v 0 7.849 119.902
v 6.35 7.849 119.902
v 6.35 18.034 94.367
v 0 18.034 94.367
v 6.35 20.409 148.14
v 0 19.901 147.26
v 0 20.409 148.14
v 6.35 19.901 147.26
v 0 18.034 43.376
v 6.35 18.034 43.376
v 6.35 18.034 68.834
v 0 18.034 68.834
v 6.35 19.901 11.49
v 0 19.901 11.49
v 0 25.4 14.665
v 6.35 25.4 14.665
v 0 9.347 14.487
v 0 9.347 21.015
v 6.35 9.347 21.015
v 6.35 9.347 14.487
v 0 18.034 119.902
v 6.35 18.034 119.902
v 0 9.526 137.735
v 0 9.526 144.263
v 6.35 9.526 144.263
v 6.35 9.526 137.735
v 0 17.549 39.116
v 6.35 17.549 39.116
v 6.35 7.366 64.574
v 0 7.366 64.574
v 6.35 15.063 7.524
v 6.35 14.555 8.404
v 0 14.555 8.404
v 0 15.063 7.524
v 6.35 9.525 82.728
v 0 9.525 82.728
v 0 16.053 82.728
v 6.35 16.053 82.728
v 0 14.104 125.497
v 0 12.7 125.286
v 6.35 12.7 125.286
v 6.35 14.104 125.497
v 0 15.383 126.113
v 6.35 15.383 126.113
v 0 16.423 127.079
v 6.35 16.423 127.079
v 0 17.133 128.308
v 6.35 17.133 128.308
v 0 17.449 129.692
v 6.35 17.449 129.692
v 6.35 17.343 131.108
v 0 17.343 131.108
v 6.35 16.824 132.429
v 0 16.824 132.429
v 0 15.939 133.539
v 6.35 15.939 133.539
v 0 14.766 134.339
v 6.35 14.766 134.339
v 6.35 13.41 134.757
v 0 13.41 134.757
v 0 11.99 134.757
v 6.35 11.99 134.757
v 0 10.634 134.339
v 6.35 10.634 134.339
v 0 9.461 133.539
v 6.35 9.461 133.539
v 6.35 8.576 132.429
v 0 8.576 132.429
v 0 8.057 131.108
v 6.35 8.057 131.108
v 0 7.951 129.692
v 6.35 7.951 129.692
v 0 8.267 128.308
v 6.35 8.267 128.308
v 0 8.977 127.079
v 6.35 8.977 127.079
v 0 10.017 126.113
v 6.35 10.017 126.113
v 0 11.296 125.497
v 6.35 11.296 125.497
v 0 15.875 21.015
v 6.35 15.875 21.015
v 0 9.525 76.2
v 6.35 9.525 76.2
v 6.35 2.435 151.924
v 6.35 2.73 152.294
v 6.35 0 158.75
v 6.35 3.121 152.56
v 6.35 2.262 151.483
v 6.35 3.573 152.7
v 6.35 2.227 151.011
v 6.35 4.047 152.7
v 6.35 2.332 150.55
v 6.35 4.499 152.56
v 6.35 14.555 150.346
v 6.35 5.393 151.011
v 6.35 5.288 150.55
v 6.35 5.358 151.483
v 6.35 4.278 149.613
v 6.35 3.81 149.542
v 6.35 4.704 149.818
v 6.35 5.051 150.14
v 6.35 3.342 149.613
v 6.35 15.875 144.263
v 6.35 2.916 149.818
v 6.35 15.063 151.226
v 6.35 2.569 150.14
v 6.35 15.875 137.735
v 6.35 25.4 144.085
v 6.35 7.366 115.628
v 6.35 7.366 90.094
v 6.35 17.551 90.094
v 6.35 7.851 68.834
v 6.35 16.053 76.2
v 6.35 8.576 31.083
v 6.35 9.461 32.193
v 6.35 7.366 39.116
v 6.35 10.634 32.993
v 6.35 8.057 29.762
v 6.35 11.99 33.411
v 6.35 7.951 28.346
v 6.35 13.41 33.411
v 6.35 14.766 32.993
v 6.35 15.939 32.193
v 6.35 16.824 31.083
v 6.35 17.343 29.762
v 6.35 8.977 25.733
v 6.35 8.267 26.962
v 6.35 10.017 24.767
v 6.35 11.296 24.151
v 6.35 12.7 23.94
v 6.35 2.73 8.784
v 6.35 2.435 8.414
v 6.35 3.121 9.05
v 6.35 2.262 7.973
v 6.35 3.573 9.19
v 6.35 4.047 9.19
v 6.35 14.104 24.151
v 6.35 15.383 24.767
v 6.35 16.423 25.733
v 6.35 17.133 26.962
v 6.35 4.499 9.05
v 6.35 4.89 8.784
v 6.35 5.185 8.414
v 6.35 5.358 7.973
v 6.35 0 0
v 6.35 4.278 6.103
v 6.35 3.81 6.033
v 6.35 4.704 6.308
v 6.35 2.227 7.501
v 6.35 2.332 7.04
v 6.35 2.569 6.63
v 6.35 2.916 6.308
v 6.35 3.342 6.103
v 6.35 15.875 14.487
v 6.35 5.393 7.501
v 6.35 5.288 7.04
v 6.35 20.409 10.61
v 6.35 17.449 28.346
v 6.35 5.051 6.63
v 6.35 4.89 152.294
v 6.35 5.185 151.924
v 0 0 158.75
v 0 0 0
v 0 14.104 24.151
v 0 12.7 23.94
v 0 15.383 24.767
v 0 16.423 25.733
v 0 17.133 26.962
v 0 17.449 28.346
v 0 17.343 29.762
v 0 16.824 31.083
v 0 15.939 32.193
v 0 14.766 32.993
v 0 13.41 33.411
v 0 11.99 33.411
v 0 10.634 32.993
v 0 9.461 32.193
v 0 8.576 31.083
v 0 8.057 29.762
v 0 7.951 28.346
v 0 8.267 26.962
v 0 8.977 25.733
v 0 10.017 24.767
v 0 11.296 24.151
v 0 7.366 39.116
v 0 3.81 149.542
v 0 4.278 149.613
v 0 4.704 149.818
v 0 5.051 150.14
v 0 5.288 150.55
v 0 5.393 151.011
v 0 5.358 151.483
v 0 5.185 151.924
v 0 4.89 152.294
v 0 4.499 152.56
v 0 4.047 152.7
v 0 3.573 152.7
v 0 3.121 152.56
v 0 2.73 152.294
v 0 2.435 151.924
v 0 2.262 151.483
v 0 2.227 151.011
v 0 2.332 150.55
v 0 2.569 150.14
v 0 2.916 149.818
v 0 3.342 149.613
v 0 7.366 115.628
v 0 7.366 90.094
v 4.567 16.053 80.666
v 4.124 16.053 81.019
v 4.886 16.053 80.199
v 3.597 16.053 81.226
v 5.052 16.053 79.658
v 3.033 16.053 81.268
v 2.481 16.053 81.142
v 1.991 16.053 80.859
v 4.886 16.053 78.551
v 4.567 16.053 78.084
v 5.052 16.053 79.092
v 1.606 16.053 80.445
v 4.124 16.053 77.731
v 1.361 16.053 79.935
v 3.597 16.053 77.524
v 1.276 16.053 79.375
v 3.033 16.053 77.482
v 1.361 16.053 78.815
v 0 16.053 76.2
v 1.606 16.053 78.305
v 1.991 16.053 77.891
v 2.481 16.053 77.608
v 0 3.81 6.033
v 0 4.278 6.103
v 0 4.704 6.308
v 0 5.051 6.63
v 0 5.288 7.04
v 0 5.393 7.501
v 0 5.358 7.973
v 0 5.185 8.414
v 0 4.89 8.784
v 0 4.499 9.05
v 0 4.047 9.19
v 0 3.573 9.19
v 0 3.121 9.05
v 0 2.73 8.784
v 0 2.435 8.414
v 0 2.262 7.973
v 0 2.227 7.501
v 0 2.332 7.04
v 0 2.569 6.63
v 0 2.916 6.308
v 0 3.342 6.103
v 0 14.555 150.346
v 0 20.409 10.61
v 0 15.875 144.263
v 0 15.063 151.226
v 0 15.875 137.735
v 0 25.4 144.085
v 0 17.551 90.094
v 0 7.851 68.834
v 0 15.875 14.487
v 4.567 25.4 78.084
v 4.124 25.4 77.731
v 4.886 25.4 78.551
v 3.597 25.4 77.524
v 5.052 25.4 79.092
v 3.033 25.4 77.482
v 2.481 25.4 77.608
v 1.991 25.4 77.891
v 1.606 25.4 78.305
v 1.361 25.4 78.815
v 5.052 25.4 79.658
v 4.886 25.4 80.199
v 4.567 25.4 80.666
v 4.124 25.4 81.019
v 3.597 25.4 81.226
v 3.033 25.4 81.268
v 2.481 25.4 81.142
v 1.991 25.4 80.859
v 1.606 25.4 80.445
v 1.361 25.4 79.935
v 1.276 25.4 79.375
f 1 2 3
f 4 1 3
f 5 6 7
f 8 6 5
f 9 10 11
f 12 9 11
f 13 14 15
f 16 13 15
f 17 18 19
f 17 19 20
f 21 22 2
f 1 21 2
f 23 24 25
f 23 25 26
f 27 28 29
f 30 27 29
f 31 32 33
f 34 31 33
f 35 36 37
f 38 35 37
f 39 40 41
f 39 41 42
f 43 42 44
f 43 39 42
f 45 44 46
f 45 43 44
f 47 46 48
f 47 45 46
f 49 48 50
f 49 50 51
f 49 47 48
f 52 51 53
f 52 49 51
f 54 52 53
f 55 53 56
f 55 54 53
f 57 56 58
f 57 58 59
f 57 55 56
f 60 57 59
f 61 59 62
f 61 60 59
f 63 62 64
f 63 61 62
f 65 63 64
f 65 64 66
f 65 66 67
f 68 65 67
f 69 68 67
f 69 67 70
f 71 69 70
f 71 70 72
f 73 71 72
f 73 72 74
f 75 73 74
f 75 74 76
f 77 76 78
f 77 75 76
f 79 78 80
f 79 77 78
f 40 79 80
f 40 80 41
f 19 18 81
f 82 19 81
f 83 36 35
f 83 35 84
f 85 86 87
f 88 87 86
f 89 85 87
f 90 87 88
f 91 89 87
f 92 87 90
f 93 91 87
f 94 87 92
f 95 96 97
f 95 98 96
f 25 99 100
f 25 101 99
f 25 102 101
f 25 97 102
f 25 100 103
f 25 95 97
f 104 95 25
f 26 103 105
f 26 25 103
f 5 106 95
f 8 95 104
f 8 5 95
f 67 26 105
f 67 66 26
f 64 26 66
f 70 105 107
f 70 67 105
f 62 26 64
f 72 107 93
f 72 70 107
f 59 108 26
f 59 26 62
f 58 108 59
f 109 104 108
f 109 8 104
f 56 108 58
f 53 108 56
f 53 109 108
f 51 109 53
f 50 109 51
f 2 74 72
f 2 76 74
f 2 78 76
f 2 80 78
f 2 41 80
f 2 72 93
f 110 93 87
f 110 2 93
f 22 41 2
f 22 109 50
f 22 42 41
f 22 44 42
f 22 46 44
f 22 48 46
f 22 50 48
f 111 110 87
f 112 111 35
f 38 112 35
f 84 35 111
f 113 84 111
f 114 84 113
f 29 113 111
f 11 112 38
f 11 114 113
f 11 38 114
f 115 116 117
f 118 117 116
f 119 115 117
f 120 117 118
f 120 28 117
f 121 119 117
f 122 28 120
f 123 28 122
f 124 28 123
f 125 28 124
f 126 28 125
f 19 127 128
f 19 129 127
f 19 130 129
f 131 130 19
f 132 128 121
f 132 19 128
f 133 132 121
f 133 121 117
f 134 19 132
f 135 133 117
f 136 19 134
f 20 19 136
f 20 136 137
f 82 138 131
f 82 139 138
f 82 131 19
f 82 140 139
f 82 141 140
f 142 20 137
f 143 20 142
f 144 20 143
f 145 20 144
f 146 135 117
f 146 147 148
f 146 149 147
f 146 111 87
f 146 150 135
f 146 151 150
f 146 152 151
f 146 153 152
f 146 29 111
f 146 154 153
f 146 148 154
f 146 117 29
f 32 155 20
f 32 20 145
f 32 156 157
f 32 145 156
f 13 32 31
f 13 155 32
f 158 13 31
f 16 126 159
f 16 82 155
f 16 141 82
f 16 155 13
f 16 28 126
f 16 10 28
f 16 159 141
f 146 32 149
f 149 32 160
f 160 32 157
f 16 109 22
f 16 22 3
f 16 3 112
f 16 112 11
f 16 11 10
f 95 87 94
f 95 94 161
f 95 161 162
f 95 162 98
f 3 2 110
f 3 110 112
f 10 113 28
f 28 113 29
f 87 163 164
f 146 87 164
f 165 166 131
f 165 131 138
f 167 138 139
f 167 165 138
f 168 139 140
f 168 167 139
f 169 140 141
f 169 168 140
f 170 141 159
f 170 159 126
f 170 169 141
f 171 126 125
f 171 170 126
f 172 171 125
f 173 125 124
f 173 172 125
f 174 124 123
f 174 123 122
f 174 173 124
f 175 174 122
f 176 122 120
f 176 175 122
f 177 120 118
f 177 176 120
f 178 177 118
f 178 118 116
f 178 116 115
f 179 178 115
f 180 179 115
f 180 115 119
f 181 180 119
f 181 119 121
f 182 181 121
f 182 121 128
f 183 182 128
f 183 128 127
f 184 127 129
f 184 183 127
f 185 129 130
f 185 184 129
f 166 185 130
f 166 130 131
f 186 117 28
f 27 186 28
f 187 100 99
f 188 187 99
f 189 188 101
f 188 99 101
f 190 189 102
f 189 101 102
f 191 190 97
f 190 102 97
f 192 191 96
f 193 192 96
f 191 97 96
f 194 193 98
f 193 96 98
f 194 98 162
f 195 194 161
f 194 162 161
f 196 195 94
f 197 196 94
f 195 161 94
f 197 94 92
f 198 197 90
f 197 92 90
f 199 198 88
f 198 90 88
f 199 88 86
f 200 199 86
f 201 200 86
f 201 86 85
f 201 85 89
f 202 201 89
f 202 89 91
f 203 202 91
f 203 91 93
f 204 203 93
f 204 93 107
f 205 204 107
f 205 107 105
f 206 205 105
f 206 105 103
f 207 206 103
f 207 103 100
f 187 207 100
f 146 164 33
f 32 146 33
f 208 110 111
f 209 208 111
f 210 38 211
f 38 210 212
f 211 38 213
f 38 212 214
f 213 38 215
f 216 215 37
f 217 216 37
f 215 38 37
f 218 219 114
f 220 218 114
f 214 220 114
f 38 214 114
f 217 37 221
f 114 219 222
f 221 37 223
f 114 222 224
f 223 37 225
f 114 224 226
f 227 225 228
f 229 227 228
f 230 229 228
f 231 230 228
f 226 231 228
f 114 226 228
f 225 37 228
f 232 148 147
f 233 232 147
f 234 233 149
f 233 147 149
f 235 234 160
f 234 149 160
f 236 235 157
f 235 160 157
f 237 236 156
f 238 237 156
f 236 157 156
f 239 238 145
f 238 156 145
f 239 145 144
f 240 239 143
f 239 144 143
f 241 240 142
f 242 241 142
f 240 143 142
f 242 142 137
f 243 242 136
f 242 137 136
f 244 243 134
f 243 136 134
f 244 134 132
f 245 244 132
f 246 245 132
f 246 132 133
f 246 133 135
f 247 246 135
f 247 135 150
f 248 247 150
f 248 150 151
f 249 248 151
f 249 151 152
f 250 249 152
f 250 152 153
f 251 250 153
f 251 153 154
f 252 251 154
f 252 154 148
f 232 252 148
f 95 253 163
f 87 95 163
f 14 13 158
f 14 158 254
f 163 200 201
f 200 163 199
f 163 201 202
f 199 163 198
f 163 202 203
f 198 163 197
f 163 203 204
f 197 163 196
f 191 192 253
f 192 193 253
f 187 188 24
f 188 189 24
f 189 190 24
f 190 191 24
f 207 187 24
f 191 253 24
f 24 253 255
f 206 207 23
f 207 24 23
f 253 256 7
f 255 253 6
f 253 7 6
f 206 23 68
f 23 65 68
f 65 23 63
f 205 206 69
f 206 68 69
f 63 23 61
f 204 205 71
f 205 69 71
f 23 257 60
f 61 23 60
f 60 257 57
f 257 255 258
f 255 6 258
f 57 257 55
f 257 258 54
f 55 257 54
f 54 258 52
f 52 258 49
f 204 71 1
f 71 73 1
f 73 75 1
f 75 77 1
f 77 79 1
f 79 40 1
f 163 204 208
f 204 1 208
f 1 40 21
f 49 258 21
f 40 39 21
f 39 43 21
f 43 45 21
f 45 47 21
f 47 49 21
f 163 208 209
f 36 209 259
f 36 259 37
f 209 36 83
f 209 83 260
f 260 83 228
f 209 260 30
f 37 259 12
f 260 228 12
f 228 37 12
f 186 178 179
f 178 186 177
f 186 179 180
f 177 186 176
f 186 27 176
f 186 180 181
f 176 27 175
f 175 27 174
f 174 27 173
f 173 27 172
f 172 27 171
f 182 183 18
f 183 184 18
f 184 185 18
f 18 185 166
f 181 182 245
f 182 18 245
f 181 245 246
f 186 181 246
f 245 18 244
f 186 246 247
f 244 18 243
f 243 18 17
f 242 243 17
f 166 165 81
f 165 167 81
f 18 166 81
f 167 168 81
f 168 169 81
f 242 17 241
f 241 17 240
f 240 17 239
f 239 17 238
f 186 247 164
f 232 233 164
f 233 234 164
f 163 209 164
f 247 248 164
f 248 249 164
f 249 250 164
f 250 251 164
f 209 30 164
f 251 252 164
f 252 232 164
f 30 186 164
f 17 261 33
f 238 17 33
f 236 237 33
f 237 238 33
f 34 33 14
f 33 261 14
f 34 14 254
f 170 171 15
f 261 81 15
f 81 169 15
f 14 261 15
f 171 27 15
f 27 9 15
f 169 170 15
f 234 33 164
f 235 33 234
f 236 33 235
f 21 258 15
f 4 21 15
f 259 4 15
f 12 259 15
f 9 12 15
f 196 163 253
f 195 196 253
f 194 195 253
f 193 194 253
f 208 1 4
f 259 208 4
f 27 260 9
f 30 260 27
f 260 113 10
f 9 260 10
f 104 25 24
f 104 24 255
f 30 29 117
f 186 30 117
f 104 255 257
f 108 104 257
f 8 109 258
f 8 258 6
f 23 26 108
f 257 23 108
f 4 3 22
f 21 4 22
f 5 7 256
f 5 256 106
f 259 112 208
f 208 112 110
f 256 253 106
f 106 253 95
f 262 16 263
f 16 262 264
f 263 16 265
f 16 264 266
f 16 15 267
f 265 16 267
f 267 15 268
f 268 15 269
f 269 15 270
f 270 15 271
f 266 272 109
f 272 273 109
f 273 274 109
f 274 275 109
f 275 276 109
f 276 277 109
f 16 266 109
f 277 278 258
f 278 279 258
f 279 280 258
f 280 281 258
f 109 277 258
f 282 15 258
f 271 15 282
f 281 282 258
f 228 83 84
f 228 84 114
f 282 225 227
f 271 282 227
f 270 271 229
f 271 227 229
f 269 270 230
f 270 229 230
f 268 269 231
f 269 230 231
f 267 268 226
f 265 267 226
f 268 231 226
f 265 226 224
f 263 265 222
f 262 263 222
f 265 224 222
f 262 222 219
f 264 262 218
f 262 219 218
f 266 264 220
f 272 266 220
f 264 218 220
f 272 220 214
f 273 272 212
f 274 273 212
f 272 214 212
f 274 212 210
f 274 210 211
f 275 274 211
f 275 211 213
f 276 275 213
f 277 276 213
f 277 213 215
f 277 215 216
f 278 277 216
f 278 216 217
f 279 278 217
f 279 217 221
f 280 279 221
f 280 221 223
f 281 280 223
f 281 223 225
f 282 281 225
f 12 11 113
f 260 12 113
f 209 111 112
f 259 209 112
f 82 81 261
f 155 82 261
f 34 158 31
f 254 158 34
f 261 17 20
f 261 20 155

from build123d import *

# Parameters (mm, degrees)
SKETCH1_R                 = 4.7625
SKETCH1_W                 = 6.5278
SKETCH1_H                 = 6.5278
SKETCH1_H_2               = 6.348837221
BOSS_EXTRUDE1_DEPTH       = 6.35
F_6_CLEARANCE_HOLE1_D     = 3.7973
F_6_CLEARANCE_HOLE1_DEPTH = 12.7
F_6_CLEARANCE_HOLE1_TIP   = 1.140824014
SKETCH7_W                 = 6.35
SKETCH7_H                 = 6.1722
BOSS_EXTRUDE2_DEPTH       = 1.016
SKETCH8_W                 = 6.35
SKETCH8_H                 = 6.1722
BOSS_EXTRUDE3_DEPTH       = 1.016
SKETCH9_R                 = 1.5875
CUT_EXTRUDE1_DEPTH        = 161.894515133
CUT_EXTRUDE2_DEPTH        = 161.894515133


with BuildPart() as part:
    # Sketch1 → Boss-Extrude1 (new body)
    with BuildSketch(Plane(origin=(0, 0, 0), x_dir=(0, 0, -1), z_dir=(1, 0, 0))):
        Polygon((0, 0), (-14.664696837, 25.4), (-144.085303163, 25.4), (-158.75, 0), align=None)
        with Locations((-130.048, 12.7)):
            Circle(SKETCH1_R, mode=Mode.SUBTRACT)
        with Locations((-28.702, 12.7)):
            Circle(SKETCH1_R, mode=Mode.SUBTRACT)
        with Locations((-17.750796837, 12.6111)):
            Rectangle(SKETCH1_W, SKETCH1_H, mode=Mode.SUBTRACT)
        with Locations((-140.999203163, 12.70058139)):
            Rectangle(SKETCH1_W, SKETCH1_H_2, mode=Mode.SUBTRACT)
        with Locations((-79.4639, 12.7889)):
            Rectangle(SKETCH1_W, SKETCH1_H, mode=Mode.SUBTRACT)
    extrude(amount=BOSS_EXTRUDE1_DEPTH)

    # #6 Clearance Hole1
    with Locations(Plane(origin=(0, 25.4, 0), x_dir=(1, 0, 0), z_dir=(0, 1, 0))):
        with Locations((3.175, -79.375)):
            Hole(F_6_CLEARANCE_HOLE1_D / 2, depth=F_6_CLEARANCE_HOLE1_DEPTH)
            with Locations((0, 0, -(F_6_CLEARANCE_HOLE1_DEPTH + F_6_CLEARANCE_HOLE1_TIP / 2))):  # 118° drill point
                Cone(0, F_6_CLEARANCE_HOLE1_D / 2, F_6_CLEARANCE_HOLE1_TIP, mode=Mode.SUBTRACT)

    # Sketch7 → Boss-Extrude2 (add)
    with BuildSketch(Plane(origin=(0, 0, 0), x_dir=(-1, 0, 0), z_dir=(0, 0.499999999999998, -0.8660254037844397))):
        with Locations((-3.175, 19.893293675)):
            Rectangle(SKETCH7_W, SKETCH7_H)
    extrude(amount=BOSS_EXTRUDE2_DEPTH)

    # Sketch8 → Boss-Extrude3 (add)
    with BuildSketch(Plane(origin=(0, 68.740766425, 119.0625), x_dir=(1, 0, 0), z_dir=(0, 0.500000000000004, 0.8660254037844365))):
        with Locations((3.175, -59.481706325)):
            Rectangle(SKETCH8_W, SKETCH8_H)
    extrude(amount=BOSS_EXTRUDE3_DEPTH)

    # Sketch9 → Cut-Extrude1 (cut, through all)
    with BuildSketch(Plane(origin=(6.35, 0, 0), x_dir=(0, 0, -1), z_dir=(1, 0, 0))):
        with Locations((-151.13, 3.81)):
            Circle(SKETCH9_R)
        with Locations((-7.62, 3.81)):
            Circle(SKETCH9_R)
    extrude(amount=-CUT_EXTRUDE1_DEPTH, mode=Mode.SUBTRACT)

    # Sketch10 → Cut-Extrude2 (cut, through all)
    with BuildSketch(Plane(origin=(6.35, 0, 0), x_dir=(0, 0, -1), z_dir=(1, 0, 0))):
        Polygon((-90.0938, 7.366), (-90.0938, 17.550906382), (-115.628105199, 7.366), align=None)
        Polygon((-119.901628846, 7.849093618), (-94.367323648, 18.034), (-119.901628846, 18.034), align=None)
        Polygon((-68.834, 7.850665489), (-43.375663722, 18.034), (-68.834, 18.034), align=None)
        Polygon((-39.116, 7.366), (-39.116, 17.549334511), (-64.574336278, 7.366), align=None)
    extrude(amount=-CUT_EXTRUDE2_DEPTH, mode=Mode.SUBTRACT)


solid = part.part
